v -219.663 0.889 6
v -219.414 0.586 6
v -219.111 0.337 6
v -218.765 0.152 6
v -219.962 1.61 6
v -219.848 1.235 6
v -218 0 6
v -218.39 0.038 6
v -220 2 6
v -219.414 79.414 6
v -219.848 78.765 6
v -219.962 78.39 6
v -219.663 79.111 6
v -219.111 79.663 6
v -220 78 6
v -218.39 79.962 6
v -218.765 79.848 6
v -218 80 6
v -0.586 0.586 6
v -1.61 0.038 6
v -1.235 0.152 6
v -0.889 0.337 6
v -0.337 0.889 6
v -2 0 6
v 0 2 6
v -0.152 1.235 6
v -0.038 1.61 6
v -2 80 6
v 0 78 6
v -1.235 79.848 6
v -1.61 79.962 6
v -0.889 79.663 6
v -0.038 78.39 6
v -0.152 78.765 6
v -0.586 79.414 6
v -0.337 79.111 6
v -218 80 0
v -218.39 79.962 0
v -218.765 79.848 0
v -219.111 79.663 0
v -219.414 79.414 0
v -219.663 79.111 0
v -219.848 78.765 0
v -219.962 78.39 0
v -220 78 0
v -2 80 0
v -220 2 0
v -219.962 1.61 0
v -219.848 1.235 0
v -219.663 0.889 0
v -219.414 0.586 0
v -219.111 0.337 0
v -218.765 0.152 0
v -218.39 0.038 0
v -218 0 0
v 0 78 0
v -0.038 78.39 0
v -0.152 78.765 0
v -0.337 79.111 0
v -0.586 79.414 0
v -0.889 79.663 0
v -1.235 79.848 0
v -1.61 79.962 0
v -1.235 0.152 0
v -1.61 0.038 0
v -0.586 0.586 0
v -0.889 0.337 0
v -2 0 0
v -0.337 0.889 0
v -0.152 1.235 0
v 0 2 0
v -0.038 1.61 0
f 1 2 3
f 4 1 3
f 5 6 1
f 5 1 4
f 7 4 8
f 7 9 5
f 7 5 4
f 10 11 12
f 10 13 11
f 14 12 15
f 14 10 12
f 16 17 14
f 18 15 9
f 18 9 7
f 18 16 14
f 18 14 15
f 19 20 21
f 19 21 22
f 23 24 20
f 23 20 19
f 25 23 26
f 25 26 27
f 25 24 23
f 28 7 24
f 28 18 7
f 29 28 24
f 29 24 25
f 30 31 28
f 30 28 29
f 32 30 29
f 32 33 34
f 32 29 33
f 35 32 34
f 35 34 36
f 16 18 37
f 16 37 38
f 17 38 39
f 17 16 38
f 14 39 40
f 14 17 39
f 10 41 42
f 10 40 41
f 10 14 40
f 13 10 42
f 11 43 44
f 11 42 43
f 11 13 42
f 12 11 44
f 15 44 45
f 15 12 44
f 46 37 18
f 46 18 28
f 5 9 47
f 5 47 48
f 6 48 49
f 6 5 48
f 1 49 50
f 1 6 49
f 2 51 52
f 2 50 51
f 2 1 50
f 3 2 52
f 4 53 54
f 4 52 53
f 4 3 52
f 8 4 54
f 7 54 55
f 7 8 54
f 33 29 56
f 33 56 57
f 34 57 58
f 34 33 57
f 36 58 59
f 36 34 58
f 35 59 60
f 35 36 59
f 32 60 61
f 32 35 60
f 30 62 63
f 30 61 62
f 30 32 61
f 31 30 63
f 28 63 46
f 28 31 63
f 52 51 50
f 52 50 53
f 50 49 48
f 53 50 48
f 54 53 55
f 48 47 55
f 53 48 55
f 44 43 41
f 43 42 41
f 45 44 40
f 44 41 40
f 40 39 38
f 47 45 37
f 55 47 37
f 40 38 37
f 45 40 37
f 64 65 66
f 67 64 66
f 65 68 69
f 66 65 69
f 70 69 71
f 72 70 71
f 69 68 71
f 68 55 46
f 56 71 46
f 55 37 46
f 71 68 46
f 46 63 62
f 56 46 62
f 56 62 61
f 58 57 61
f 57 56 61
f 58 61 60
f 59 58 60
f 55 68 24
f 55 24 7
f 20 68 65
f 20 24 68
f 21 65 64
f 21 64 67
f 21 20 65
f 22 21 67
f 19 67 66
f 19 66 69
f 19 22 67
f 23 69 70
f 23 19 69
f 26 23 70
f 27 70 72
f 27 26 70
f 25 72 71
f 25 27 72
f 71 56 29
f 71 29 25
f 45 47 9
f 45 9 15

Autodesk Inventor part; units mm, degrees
ref_plane "YZ Plane" through (0, 0, 0) normal (1, 0, 0) x (0, 1, 0)
sketch "Skizze3" plane through (0, 0, 0) normal (0, 0, 1) x (1, 0, 0)
  line L0 (0, 0) -> (-220, 0)
  line L1 (-220, 0) -> (-220, 80)
  line L2 (-220, 80) -> (0, 80)
  line L3 (0, 80) -> (0, 0)
  line L4 (-60, 11.8952) -> (-60, -14.2347) construction
  line L5 (-11.7549, 40) -> (14.0889, 40) construction
  point P0 (-60, 8)
  point P1 (-8, 40)
  point P2 (0, 40)
  dimension "d4" = 80
  dimension "d5" = 220
  dimension "d27" = 60
  dimension "d28" = 8
  dimension "d29" = 8
extrude "Extrusion3" add sketch "Skizze3" along normal blind 6
ref_plane "Arbeitsebene1" through (-110, 80, 6) normal (-1, 0, 0) x (0, -1, 0)
ref_plane "Arbeitsebene2" through (-220, 40, 6) normal (0, -1, 0) x (1, 0, 0)
fillet "Rundung2" radius 2 4 edges at (0, 0, 3) (0, 80, 3) (-220, 80, 3) (-220, 0, 3)
properties part number "BT005_trajan20_21" material "Acryl"
